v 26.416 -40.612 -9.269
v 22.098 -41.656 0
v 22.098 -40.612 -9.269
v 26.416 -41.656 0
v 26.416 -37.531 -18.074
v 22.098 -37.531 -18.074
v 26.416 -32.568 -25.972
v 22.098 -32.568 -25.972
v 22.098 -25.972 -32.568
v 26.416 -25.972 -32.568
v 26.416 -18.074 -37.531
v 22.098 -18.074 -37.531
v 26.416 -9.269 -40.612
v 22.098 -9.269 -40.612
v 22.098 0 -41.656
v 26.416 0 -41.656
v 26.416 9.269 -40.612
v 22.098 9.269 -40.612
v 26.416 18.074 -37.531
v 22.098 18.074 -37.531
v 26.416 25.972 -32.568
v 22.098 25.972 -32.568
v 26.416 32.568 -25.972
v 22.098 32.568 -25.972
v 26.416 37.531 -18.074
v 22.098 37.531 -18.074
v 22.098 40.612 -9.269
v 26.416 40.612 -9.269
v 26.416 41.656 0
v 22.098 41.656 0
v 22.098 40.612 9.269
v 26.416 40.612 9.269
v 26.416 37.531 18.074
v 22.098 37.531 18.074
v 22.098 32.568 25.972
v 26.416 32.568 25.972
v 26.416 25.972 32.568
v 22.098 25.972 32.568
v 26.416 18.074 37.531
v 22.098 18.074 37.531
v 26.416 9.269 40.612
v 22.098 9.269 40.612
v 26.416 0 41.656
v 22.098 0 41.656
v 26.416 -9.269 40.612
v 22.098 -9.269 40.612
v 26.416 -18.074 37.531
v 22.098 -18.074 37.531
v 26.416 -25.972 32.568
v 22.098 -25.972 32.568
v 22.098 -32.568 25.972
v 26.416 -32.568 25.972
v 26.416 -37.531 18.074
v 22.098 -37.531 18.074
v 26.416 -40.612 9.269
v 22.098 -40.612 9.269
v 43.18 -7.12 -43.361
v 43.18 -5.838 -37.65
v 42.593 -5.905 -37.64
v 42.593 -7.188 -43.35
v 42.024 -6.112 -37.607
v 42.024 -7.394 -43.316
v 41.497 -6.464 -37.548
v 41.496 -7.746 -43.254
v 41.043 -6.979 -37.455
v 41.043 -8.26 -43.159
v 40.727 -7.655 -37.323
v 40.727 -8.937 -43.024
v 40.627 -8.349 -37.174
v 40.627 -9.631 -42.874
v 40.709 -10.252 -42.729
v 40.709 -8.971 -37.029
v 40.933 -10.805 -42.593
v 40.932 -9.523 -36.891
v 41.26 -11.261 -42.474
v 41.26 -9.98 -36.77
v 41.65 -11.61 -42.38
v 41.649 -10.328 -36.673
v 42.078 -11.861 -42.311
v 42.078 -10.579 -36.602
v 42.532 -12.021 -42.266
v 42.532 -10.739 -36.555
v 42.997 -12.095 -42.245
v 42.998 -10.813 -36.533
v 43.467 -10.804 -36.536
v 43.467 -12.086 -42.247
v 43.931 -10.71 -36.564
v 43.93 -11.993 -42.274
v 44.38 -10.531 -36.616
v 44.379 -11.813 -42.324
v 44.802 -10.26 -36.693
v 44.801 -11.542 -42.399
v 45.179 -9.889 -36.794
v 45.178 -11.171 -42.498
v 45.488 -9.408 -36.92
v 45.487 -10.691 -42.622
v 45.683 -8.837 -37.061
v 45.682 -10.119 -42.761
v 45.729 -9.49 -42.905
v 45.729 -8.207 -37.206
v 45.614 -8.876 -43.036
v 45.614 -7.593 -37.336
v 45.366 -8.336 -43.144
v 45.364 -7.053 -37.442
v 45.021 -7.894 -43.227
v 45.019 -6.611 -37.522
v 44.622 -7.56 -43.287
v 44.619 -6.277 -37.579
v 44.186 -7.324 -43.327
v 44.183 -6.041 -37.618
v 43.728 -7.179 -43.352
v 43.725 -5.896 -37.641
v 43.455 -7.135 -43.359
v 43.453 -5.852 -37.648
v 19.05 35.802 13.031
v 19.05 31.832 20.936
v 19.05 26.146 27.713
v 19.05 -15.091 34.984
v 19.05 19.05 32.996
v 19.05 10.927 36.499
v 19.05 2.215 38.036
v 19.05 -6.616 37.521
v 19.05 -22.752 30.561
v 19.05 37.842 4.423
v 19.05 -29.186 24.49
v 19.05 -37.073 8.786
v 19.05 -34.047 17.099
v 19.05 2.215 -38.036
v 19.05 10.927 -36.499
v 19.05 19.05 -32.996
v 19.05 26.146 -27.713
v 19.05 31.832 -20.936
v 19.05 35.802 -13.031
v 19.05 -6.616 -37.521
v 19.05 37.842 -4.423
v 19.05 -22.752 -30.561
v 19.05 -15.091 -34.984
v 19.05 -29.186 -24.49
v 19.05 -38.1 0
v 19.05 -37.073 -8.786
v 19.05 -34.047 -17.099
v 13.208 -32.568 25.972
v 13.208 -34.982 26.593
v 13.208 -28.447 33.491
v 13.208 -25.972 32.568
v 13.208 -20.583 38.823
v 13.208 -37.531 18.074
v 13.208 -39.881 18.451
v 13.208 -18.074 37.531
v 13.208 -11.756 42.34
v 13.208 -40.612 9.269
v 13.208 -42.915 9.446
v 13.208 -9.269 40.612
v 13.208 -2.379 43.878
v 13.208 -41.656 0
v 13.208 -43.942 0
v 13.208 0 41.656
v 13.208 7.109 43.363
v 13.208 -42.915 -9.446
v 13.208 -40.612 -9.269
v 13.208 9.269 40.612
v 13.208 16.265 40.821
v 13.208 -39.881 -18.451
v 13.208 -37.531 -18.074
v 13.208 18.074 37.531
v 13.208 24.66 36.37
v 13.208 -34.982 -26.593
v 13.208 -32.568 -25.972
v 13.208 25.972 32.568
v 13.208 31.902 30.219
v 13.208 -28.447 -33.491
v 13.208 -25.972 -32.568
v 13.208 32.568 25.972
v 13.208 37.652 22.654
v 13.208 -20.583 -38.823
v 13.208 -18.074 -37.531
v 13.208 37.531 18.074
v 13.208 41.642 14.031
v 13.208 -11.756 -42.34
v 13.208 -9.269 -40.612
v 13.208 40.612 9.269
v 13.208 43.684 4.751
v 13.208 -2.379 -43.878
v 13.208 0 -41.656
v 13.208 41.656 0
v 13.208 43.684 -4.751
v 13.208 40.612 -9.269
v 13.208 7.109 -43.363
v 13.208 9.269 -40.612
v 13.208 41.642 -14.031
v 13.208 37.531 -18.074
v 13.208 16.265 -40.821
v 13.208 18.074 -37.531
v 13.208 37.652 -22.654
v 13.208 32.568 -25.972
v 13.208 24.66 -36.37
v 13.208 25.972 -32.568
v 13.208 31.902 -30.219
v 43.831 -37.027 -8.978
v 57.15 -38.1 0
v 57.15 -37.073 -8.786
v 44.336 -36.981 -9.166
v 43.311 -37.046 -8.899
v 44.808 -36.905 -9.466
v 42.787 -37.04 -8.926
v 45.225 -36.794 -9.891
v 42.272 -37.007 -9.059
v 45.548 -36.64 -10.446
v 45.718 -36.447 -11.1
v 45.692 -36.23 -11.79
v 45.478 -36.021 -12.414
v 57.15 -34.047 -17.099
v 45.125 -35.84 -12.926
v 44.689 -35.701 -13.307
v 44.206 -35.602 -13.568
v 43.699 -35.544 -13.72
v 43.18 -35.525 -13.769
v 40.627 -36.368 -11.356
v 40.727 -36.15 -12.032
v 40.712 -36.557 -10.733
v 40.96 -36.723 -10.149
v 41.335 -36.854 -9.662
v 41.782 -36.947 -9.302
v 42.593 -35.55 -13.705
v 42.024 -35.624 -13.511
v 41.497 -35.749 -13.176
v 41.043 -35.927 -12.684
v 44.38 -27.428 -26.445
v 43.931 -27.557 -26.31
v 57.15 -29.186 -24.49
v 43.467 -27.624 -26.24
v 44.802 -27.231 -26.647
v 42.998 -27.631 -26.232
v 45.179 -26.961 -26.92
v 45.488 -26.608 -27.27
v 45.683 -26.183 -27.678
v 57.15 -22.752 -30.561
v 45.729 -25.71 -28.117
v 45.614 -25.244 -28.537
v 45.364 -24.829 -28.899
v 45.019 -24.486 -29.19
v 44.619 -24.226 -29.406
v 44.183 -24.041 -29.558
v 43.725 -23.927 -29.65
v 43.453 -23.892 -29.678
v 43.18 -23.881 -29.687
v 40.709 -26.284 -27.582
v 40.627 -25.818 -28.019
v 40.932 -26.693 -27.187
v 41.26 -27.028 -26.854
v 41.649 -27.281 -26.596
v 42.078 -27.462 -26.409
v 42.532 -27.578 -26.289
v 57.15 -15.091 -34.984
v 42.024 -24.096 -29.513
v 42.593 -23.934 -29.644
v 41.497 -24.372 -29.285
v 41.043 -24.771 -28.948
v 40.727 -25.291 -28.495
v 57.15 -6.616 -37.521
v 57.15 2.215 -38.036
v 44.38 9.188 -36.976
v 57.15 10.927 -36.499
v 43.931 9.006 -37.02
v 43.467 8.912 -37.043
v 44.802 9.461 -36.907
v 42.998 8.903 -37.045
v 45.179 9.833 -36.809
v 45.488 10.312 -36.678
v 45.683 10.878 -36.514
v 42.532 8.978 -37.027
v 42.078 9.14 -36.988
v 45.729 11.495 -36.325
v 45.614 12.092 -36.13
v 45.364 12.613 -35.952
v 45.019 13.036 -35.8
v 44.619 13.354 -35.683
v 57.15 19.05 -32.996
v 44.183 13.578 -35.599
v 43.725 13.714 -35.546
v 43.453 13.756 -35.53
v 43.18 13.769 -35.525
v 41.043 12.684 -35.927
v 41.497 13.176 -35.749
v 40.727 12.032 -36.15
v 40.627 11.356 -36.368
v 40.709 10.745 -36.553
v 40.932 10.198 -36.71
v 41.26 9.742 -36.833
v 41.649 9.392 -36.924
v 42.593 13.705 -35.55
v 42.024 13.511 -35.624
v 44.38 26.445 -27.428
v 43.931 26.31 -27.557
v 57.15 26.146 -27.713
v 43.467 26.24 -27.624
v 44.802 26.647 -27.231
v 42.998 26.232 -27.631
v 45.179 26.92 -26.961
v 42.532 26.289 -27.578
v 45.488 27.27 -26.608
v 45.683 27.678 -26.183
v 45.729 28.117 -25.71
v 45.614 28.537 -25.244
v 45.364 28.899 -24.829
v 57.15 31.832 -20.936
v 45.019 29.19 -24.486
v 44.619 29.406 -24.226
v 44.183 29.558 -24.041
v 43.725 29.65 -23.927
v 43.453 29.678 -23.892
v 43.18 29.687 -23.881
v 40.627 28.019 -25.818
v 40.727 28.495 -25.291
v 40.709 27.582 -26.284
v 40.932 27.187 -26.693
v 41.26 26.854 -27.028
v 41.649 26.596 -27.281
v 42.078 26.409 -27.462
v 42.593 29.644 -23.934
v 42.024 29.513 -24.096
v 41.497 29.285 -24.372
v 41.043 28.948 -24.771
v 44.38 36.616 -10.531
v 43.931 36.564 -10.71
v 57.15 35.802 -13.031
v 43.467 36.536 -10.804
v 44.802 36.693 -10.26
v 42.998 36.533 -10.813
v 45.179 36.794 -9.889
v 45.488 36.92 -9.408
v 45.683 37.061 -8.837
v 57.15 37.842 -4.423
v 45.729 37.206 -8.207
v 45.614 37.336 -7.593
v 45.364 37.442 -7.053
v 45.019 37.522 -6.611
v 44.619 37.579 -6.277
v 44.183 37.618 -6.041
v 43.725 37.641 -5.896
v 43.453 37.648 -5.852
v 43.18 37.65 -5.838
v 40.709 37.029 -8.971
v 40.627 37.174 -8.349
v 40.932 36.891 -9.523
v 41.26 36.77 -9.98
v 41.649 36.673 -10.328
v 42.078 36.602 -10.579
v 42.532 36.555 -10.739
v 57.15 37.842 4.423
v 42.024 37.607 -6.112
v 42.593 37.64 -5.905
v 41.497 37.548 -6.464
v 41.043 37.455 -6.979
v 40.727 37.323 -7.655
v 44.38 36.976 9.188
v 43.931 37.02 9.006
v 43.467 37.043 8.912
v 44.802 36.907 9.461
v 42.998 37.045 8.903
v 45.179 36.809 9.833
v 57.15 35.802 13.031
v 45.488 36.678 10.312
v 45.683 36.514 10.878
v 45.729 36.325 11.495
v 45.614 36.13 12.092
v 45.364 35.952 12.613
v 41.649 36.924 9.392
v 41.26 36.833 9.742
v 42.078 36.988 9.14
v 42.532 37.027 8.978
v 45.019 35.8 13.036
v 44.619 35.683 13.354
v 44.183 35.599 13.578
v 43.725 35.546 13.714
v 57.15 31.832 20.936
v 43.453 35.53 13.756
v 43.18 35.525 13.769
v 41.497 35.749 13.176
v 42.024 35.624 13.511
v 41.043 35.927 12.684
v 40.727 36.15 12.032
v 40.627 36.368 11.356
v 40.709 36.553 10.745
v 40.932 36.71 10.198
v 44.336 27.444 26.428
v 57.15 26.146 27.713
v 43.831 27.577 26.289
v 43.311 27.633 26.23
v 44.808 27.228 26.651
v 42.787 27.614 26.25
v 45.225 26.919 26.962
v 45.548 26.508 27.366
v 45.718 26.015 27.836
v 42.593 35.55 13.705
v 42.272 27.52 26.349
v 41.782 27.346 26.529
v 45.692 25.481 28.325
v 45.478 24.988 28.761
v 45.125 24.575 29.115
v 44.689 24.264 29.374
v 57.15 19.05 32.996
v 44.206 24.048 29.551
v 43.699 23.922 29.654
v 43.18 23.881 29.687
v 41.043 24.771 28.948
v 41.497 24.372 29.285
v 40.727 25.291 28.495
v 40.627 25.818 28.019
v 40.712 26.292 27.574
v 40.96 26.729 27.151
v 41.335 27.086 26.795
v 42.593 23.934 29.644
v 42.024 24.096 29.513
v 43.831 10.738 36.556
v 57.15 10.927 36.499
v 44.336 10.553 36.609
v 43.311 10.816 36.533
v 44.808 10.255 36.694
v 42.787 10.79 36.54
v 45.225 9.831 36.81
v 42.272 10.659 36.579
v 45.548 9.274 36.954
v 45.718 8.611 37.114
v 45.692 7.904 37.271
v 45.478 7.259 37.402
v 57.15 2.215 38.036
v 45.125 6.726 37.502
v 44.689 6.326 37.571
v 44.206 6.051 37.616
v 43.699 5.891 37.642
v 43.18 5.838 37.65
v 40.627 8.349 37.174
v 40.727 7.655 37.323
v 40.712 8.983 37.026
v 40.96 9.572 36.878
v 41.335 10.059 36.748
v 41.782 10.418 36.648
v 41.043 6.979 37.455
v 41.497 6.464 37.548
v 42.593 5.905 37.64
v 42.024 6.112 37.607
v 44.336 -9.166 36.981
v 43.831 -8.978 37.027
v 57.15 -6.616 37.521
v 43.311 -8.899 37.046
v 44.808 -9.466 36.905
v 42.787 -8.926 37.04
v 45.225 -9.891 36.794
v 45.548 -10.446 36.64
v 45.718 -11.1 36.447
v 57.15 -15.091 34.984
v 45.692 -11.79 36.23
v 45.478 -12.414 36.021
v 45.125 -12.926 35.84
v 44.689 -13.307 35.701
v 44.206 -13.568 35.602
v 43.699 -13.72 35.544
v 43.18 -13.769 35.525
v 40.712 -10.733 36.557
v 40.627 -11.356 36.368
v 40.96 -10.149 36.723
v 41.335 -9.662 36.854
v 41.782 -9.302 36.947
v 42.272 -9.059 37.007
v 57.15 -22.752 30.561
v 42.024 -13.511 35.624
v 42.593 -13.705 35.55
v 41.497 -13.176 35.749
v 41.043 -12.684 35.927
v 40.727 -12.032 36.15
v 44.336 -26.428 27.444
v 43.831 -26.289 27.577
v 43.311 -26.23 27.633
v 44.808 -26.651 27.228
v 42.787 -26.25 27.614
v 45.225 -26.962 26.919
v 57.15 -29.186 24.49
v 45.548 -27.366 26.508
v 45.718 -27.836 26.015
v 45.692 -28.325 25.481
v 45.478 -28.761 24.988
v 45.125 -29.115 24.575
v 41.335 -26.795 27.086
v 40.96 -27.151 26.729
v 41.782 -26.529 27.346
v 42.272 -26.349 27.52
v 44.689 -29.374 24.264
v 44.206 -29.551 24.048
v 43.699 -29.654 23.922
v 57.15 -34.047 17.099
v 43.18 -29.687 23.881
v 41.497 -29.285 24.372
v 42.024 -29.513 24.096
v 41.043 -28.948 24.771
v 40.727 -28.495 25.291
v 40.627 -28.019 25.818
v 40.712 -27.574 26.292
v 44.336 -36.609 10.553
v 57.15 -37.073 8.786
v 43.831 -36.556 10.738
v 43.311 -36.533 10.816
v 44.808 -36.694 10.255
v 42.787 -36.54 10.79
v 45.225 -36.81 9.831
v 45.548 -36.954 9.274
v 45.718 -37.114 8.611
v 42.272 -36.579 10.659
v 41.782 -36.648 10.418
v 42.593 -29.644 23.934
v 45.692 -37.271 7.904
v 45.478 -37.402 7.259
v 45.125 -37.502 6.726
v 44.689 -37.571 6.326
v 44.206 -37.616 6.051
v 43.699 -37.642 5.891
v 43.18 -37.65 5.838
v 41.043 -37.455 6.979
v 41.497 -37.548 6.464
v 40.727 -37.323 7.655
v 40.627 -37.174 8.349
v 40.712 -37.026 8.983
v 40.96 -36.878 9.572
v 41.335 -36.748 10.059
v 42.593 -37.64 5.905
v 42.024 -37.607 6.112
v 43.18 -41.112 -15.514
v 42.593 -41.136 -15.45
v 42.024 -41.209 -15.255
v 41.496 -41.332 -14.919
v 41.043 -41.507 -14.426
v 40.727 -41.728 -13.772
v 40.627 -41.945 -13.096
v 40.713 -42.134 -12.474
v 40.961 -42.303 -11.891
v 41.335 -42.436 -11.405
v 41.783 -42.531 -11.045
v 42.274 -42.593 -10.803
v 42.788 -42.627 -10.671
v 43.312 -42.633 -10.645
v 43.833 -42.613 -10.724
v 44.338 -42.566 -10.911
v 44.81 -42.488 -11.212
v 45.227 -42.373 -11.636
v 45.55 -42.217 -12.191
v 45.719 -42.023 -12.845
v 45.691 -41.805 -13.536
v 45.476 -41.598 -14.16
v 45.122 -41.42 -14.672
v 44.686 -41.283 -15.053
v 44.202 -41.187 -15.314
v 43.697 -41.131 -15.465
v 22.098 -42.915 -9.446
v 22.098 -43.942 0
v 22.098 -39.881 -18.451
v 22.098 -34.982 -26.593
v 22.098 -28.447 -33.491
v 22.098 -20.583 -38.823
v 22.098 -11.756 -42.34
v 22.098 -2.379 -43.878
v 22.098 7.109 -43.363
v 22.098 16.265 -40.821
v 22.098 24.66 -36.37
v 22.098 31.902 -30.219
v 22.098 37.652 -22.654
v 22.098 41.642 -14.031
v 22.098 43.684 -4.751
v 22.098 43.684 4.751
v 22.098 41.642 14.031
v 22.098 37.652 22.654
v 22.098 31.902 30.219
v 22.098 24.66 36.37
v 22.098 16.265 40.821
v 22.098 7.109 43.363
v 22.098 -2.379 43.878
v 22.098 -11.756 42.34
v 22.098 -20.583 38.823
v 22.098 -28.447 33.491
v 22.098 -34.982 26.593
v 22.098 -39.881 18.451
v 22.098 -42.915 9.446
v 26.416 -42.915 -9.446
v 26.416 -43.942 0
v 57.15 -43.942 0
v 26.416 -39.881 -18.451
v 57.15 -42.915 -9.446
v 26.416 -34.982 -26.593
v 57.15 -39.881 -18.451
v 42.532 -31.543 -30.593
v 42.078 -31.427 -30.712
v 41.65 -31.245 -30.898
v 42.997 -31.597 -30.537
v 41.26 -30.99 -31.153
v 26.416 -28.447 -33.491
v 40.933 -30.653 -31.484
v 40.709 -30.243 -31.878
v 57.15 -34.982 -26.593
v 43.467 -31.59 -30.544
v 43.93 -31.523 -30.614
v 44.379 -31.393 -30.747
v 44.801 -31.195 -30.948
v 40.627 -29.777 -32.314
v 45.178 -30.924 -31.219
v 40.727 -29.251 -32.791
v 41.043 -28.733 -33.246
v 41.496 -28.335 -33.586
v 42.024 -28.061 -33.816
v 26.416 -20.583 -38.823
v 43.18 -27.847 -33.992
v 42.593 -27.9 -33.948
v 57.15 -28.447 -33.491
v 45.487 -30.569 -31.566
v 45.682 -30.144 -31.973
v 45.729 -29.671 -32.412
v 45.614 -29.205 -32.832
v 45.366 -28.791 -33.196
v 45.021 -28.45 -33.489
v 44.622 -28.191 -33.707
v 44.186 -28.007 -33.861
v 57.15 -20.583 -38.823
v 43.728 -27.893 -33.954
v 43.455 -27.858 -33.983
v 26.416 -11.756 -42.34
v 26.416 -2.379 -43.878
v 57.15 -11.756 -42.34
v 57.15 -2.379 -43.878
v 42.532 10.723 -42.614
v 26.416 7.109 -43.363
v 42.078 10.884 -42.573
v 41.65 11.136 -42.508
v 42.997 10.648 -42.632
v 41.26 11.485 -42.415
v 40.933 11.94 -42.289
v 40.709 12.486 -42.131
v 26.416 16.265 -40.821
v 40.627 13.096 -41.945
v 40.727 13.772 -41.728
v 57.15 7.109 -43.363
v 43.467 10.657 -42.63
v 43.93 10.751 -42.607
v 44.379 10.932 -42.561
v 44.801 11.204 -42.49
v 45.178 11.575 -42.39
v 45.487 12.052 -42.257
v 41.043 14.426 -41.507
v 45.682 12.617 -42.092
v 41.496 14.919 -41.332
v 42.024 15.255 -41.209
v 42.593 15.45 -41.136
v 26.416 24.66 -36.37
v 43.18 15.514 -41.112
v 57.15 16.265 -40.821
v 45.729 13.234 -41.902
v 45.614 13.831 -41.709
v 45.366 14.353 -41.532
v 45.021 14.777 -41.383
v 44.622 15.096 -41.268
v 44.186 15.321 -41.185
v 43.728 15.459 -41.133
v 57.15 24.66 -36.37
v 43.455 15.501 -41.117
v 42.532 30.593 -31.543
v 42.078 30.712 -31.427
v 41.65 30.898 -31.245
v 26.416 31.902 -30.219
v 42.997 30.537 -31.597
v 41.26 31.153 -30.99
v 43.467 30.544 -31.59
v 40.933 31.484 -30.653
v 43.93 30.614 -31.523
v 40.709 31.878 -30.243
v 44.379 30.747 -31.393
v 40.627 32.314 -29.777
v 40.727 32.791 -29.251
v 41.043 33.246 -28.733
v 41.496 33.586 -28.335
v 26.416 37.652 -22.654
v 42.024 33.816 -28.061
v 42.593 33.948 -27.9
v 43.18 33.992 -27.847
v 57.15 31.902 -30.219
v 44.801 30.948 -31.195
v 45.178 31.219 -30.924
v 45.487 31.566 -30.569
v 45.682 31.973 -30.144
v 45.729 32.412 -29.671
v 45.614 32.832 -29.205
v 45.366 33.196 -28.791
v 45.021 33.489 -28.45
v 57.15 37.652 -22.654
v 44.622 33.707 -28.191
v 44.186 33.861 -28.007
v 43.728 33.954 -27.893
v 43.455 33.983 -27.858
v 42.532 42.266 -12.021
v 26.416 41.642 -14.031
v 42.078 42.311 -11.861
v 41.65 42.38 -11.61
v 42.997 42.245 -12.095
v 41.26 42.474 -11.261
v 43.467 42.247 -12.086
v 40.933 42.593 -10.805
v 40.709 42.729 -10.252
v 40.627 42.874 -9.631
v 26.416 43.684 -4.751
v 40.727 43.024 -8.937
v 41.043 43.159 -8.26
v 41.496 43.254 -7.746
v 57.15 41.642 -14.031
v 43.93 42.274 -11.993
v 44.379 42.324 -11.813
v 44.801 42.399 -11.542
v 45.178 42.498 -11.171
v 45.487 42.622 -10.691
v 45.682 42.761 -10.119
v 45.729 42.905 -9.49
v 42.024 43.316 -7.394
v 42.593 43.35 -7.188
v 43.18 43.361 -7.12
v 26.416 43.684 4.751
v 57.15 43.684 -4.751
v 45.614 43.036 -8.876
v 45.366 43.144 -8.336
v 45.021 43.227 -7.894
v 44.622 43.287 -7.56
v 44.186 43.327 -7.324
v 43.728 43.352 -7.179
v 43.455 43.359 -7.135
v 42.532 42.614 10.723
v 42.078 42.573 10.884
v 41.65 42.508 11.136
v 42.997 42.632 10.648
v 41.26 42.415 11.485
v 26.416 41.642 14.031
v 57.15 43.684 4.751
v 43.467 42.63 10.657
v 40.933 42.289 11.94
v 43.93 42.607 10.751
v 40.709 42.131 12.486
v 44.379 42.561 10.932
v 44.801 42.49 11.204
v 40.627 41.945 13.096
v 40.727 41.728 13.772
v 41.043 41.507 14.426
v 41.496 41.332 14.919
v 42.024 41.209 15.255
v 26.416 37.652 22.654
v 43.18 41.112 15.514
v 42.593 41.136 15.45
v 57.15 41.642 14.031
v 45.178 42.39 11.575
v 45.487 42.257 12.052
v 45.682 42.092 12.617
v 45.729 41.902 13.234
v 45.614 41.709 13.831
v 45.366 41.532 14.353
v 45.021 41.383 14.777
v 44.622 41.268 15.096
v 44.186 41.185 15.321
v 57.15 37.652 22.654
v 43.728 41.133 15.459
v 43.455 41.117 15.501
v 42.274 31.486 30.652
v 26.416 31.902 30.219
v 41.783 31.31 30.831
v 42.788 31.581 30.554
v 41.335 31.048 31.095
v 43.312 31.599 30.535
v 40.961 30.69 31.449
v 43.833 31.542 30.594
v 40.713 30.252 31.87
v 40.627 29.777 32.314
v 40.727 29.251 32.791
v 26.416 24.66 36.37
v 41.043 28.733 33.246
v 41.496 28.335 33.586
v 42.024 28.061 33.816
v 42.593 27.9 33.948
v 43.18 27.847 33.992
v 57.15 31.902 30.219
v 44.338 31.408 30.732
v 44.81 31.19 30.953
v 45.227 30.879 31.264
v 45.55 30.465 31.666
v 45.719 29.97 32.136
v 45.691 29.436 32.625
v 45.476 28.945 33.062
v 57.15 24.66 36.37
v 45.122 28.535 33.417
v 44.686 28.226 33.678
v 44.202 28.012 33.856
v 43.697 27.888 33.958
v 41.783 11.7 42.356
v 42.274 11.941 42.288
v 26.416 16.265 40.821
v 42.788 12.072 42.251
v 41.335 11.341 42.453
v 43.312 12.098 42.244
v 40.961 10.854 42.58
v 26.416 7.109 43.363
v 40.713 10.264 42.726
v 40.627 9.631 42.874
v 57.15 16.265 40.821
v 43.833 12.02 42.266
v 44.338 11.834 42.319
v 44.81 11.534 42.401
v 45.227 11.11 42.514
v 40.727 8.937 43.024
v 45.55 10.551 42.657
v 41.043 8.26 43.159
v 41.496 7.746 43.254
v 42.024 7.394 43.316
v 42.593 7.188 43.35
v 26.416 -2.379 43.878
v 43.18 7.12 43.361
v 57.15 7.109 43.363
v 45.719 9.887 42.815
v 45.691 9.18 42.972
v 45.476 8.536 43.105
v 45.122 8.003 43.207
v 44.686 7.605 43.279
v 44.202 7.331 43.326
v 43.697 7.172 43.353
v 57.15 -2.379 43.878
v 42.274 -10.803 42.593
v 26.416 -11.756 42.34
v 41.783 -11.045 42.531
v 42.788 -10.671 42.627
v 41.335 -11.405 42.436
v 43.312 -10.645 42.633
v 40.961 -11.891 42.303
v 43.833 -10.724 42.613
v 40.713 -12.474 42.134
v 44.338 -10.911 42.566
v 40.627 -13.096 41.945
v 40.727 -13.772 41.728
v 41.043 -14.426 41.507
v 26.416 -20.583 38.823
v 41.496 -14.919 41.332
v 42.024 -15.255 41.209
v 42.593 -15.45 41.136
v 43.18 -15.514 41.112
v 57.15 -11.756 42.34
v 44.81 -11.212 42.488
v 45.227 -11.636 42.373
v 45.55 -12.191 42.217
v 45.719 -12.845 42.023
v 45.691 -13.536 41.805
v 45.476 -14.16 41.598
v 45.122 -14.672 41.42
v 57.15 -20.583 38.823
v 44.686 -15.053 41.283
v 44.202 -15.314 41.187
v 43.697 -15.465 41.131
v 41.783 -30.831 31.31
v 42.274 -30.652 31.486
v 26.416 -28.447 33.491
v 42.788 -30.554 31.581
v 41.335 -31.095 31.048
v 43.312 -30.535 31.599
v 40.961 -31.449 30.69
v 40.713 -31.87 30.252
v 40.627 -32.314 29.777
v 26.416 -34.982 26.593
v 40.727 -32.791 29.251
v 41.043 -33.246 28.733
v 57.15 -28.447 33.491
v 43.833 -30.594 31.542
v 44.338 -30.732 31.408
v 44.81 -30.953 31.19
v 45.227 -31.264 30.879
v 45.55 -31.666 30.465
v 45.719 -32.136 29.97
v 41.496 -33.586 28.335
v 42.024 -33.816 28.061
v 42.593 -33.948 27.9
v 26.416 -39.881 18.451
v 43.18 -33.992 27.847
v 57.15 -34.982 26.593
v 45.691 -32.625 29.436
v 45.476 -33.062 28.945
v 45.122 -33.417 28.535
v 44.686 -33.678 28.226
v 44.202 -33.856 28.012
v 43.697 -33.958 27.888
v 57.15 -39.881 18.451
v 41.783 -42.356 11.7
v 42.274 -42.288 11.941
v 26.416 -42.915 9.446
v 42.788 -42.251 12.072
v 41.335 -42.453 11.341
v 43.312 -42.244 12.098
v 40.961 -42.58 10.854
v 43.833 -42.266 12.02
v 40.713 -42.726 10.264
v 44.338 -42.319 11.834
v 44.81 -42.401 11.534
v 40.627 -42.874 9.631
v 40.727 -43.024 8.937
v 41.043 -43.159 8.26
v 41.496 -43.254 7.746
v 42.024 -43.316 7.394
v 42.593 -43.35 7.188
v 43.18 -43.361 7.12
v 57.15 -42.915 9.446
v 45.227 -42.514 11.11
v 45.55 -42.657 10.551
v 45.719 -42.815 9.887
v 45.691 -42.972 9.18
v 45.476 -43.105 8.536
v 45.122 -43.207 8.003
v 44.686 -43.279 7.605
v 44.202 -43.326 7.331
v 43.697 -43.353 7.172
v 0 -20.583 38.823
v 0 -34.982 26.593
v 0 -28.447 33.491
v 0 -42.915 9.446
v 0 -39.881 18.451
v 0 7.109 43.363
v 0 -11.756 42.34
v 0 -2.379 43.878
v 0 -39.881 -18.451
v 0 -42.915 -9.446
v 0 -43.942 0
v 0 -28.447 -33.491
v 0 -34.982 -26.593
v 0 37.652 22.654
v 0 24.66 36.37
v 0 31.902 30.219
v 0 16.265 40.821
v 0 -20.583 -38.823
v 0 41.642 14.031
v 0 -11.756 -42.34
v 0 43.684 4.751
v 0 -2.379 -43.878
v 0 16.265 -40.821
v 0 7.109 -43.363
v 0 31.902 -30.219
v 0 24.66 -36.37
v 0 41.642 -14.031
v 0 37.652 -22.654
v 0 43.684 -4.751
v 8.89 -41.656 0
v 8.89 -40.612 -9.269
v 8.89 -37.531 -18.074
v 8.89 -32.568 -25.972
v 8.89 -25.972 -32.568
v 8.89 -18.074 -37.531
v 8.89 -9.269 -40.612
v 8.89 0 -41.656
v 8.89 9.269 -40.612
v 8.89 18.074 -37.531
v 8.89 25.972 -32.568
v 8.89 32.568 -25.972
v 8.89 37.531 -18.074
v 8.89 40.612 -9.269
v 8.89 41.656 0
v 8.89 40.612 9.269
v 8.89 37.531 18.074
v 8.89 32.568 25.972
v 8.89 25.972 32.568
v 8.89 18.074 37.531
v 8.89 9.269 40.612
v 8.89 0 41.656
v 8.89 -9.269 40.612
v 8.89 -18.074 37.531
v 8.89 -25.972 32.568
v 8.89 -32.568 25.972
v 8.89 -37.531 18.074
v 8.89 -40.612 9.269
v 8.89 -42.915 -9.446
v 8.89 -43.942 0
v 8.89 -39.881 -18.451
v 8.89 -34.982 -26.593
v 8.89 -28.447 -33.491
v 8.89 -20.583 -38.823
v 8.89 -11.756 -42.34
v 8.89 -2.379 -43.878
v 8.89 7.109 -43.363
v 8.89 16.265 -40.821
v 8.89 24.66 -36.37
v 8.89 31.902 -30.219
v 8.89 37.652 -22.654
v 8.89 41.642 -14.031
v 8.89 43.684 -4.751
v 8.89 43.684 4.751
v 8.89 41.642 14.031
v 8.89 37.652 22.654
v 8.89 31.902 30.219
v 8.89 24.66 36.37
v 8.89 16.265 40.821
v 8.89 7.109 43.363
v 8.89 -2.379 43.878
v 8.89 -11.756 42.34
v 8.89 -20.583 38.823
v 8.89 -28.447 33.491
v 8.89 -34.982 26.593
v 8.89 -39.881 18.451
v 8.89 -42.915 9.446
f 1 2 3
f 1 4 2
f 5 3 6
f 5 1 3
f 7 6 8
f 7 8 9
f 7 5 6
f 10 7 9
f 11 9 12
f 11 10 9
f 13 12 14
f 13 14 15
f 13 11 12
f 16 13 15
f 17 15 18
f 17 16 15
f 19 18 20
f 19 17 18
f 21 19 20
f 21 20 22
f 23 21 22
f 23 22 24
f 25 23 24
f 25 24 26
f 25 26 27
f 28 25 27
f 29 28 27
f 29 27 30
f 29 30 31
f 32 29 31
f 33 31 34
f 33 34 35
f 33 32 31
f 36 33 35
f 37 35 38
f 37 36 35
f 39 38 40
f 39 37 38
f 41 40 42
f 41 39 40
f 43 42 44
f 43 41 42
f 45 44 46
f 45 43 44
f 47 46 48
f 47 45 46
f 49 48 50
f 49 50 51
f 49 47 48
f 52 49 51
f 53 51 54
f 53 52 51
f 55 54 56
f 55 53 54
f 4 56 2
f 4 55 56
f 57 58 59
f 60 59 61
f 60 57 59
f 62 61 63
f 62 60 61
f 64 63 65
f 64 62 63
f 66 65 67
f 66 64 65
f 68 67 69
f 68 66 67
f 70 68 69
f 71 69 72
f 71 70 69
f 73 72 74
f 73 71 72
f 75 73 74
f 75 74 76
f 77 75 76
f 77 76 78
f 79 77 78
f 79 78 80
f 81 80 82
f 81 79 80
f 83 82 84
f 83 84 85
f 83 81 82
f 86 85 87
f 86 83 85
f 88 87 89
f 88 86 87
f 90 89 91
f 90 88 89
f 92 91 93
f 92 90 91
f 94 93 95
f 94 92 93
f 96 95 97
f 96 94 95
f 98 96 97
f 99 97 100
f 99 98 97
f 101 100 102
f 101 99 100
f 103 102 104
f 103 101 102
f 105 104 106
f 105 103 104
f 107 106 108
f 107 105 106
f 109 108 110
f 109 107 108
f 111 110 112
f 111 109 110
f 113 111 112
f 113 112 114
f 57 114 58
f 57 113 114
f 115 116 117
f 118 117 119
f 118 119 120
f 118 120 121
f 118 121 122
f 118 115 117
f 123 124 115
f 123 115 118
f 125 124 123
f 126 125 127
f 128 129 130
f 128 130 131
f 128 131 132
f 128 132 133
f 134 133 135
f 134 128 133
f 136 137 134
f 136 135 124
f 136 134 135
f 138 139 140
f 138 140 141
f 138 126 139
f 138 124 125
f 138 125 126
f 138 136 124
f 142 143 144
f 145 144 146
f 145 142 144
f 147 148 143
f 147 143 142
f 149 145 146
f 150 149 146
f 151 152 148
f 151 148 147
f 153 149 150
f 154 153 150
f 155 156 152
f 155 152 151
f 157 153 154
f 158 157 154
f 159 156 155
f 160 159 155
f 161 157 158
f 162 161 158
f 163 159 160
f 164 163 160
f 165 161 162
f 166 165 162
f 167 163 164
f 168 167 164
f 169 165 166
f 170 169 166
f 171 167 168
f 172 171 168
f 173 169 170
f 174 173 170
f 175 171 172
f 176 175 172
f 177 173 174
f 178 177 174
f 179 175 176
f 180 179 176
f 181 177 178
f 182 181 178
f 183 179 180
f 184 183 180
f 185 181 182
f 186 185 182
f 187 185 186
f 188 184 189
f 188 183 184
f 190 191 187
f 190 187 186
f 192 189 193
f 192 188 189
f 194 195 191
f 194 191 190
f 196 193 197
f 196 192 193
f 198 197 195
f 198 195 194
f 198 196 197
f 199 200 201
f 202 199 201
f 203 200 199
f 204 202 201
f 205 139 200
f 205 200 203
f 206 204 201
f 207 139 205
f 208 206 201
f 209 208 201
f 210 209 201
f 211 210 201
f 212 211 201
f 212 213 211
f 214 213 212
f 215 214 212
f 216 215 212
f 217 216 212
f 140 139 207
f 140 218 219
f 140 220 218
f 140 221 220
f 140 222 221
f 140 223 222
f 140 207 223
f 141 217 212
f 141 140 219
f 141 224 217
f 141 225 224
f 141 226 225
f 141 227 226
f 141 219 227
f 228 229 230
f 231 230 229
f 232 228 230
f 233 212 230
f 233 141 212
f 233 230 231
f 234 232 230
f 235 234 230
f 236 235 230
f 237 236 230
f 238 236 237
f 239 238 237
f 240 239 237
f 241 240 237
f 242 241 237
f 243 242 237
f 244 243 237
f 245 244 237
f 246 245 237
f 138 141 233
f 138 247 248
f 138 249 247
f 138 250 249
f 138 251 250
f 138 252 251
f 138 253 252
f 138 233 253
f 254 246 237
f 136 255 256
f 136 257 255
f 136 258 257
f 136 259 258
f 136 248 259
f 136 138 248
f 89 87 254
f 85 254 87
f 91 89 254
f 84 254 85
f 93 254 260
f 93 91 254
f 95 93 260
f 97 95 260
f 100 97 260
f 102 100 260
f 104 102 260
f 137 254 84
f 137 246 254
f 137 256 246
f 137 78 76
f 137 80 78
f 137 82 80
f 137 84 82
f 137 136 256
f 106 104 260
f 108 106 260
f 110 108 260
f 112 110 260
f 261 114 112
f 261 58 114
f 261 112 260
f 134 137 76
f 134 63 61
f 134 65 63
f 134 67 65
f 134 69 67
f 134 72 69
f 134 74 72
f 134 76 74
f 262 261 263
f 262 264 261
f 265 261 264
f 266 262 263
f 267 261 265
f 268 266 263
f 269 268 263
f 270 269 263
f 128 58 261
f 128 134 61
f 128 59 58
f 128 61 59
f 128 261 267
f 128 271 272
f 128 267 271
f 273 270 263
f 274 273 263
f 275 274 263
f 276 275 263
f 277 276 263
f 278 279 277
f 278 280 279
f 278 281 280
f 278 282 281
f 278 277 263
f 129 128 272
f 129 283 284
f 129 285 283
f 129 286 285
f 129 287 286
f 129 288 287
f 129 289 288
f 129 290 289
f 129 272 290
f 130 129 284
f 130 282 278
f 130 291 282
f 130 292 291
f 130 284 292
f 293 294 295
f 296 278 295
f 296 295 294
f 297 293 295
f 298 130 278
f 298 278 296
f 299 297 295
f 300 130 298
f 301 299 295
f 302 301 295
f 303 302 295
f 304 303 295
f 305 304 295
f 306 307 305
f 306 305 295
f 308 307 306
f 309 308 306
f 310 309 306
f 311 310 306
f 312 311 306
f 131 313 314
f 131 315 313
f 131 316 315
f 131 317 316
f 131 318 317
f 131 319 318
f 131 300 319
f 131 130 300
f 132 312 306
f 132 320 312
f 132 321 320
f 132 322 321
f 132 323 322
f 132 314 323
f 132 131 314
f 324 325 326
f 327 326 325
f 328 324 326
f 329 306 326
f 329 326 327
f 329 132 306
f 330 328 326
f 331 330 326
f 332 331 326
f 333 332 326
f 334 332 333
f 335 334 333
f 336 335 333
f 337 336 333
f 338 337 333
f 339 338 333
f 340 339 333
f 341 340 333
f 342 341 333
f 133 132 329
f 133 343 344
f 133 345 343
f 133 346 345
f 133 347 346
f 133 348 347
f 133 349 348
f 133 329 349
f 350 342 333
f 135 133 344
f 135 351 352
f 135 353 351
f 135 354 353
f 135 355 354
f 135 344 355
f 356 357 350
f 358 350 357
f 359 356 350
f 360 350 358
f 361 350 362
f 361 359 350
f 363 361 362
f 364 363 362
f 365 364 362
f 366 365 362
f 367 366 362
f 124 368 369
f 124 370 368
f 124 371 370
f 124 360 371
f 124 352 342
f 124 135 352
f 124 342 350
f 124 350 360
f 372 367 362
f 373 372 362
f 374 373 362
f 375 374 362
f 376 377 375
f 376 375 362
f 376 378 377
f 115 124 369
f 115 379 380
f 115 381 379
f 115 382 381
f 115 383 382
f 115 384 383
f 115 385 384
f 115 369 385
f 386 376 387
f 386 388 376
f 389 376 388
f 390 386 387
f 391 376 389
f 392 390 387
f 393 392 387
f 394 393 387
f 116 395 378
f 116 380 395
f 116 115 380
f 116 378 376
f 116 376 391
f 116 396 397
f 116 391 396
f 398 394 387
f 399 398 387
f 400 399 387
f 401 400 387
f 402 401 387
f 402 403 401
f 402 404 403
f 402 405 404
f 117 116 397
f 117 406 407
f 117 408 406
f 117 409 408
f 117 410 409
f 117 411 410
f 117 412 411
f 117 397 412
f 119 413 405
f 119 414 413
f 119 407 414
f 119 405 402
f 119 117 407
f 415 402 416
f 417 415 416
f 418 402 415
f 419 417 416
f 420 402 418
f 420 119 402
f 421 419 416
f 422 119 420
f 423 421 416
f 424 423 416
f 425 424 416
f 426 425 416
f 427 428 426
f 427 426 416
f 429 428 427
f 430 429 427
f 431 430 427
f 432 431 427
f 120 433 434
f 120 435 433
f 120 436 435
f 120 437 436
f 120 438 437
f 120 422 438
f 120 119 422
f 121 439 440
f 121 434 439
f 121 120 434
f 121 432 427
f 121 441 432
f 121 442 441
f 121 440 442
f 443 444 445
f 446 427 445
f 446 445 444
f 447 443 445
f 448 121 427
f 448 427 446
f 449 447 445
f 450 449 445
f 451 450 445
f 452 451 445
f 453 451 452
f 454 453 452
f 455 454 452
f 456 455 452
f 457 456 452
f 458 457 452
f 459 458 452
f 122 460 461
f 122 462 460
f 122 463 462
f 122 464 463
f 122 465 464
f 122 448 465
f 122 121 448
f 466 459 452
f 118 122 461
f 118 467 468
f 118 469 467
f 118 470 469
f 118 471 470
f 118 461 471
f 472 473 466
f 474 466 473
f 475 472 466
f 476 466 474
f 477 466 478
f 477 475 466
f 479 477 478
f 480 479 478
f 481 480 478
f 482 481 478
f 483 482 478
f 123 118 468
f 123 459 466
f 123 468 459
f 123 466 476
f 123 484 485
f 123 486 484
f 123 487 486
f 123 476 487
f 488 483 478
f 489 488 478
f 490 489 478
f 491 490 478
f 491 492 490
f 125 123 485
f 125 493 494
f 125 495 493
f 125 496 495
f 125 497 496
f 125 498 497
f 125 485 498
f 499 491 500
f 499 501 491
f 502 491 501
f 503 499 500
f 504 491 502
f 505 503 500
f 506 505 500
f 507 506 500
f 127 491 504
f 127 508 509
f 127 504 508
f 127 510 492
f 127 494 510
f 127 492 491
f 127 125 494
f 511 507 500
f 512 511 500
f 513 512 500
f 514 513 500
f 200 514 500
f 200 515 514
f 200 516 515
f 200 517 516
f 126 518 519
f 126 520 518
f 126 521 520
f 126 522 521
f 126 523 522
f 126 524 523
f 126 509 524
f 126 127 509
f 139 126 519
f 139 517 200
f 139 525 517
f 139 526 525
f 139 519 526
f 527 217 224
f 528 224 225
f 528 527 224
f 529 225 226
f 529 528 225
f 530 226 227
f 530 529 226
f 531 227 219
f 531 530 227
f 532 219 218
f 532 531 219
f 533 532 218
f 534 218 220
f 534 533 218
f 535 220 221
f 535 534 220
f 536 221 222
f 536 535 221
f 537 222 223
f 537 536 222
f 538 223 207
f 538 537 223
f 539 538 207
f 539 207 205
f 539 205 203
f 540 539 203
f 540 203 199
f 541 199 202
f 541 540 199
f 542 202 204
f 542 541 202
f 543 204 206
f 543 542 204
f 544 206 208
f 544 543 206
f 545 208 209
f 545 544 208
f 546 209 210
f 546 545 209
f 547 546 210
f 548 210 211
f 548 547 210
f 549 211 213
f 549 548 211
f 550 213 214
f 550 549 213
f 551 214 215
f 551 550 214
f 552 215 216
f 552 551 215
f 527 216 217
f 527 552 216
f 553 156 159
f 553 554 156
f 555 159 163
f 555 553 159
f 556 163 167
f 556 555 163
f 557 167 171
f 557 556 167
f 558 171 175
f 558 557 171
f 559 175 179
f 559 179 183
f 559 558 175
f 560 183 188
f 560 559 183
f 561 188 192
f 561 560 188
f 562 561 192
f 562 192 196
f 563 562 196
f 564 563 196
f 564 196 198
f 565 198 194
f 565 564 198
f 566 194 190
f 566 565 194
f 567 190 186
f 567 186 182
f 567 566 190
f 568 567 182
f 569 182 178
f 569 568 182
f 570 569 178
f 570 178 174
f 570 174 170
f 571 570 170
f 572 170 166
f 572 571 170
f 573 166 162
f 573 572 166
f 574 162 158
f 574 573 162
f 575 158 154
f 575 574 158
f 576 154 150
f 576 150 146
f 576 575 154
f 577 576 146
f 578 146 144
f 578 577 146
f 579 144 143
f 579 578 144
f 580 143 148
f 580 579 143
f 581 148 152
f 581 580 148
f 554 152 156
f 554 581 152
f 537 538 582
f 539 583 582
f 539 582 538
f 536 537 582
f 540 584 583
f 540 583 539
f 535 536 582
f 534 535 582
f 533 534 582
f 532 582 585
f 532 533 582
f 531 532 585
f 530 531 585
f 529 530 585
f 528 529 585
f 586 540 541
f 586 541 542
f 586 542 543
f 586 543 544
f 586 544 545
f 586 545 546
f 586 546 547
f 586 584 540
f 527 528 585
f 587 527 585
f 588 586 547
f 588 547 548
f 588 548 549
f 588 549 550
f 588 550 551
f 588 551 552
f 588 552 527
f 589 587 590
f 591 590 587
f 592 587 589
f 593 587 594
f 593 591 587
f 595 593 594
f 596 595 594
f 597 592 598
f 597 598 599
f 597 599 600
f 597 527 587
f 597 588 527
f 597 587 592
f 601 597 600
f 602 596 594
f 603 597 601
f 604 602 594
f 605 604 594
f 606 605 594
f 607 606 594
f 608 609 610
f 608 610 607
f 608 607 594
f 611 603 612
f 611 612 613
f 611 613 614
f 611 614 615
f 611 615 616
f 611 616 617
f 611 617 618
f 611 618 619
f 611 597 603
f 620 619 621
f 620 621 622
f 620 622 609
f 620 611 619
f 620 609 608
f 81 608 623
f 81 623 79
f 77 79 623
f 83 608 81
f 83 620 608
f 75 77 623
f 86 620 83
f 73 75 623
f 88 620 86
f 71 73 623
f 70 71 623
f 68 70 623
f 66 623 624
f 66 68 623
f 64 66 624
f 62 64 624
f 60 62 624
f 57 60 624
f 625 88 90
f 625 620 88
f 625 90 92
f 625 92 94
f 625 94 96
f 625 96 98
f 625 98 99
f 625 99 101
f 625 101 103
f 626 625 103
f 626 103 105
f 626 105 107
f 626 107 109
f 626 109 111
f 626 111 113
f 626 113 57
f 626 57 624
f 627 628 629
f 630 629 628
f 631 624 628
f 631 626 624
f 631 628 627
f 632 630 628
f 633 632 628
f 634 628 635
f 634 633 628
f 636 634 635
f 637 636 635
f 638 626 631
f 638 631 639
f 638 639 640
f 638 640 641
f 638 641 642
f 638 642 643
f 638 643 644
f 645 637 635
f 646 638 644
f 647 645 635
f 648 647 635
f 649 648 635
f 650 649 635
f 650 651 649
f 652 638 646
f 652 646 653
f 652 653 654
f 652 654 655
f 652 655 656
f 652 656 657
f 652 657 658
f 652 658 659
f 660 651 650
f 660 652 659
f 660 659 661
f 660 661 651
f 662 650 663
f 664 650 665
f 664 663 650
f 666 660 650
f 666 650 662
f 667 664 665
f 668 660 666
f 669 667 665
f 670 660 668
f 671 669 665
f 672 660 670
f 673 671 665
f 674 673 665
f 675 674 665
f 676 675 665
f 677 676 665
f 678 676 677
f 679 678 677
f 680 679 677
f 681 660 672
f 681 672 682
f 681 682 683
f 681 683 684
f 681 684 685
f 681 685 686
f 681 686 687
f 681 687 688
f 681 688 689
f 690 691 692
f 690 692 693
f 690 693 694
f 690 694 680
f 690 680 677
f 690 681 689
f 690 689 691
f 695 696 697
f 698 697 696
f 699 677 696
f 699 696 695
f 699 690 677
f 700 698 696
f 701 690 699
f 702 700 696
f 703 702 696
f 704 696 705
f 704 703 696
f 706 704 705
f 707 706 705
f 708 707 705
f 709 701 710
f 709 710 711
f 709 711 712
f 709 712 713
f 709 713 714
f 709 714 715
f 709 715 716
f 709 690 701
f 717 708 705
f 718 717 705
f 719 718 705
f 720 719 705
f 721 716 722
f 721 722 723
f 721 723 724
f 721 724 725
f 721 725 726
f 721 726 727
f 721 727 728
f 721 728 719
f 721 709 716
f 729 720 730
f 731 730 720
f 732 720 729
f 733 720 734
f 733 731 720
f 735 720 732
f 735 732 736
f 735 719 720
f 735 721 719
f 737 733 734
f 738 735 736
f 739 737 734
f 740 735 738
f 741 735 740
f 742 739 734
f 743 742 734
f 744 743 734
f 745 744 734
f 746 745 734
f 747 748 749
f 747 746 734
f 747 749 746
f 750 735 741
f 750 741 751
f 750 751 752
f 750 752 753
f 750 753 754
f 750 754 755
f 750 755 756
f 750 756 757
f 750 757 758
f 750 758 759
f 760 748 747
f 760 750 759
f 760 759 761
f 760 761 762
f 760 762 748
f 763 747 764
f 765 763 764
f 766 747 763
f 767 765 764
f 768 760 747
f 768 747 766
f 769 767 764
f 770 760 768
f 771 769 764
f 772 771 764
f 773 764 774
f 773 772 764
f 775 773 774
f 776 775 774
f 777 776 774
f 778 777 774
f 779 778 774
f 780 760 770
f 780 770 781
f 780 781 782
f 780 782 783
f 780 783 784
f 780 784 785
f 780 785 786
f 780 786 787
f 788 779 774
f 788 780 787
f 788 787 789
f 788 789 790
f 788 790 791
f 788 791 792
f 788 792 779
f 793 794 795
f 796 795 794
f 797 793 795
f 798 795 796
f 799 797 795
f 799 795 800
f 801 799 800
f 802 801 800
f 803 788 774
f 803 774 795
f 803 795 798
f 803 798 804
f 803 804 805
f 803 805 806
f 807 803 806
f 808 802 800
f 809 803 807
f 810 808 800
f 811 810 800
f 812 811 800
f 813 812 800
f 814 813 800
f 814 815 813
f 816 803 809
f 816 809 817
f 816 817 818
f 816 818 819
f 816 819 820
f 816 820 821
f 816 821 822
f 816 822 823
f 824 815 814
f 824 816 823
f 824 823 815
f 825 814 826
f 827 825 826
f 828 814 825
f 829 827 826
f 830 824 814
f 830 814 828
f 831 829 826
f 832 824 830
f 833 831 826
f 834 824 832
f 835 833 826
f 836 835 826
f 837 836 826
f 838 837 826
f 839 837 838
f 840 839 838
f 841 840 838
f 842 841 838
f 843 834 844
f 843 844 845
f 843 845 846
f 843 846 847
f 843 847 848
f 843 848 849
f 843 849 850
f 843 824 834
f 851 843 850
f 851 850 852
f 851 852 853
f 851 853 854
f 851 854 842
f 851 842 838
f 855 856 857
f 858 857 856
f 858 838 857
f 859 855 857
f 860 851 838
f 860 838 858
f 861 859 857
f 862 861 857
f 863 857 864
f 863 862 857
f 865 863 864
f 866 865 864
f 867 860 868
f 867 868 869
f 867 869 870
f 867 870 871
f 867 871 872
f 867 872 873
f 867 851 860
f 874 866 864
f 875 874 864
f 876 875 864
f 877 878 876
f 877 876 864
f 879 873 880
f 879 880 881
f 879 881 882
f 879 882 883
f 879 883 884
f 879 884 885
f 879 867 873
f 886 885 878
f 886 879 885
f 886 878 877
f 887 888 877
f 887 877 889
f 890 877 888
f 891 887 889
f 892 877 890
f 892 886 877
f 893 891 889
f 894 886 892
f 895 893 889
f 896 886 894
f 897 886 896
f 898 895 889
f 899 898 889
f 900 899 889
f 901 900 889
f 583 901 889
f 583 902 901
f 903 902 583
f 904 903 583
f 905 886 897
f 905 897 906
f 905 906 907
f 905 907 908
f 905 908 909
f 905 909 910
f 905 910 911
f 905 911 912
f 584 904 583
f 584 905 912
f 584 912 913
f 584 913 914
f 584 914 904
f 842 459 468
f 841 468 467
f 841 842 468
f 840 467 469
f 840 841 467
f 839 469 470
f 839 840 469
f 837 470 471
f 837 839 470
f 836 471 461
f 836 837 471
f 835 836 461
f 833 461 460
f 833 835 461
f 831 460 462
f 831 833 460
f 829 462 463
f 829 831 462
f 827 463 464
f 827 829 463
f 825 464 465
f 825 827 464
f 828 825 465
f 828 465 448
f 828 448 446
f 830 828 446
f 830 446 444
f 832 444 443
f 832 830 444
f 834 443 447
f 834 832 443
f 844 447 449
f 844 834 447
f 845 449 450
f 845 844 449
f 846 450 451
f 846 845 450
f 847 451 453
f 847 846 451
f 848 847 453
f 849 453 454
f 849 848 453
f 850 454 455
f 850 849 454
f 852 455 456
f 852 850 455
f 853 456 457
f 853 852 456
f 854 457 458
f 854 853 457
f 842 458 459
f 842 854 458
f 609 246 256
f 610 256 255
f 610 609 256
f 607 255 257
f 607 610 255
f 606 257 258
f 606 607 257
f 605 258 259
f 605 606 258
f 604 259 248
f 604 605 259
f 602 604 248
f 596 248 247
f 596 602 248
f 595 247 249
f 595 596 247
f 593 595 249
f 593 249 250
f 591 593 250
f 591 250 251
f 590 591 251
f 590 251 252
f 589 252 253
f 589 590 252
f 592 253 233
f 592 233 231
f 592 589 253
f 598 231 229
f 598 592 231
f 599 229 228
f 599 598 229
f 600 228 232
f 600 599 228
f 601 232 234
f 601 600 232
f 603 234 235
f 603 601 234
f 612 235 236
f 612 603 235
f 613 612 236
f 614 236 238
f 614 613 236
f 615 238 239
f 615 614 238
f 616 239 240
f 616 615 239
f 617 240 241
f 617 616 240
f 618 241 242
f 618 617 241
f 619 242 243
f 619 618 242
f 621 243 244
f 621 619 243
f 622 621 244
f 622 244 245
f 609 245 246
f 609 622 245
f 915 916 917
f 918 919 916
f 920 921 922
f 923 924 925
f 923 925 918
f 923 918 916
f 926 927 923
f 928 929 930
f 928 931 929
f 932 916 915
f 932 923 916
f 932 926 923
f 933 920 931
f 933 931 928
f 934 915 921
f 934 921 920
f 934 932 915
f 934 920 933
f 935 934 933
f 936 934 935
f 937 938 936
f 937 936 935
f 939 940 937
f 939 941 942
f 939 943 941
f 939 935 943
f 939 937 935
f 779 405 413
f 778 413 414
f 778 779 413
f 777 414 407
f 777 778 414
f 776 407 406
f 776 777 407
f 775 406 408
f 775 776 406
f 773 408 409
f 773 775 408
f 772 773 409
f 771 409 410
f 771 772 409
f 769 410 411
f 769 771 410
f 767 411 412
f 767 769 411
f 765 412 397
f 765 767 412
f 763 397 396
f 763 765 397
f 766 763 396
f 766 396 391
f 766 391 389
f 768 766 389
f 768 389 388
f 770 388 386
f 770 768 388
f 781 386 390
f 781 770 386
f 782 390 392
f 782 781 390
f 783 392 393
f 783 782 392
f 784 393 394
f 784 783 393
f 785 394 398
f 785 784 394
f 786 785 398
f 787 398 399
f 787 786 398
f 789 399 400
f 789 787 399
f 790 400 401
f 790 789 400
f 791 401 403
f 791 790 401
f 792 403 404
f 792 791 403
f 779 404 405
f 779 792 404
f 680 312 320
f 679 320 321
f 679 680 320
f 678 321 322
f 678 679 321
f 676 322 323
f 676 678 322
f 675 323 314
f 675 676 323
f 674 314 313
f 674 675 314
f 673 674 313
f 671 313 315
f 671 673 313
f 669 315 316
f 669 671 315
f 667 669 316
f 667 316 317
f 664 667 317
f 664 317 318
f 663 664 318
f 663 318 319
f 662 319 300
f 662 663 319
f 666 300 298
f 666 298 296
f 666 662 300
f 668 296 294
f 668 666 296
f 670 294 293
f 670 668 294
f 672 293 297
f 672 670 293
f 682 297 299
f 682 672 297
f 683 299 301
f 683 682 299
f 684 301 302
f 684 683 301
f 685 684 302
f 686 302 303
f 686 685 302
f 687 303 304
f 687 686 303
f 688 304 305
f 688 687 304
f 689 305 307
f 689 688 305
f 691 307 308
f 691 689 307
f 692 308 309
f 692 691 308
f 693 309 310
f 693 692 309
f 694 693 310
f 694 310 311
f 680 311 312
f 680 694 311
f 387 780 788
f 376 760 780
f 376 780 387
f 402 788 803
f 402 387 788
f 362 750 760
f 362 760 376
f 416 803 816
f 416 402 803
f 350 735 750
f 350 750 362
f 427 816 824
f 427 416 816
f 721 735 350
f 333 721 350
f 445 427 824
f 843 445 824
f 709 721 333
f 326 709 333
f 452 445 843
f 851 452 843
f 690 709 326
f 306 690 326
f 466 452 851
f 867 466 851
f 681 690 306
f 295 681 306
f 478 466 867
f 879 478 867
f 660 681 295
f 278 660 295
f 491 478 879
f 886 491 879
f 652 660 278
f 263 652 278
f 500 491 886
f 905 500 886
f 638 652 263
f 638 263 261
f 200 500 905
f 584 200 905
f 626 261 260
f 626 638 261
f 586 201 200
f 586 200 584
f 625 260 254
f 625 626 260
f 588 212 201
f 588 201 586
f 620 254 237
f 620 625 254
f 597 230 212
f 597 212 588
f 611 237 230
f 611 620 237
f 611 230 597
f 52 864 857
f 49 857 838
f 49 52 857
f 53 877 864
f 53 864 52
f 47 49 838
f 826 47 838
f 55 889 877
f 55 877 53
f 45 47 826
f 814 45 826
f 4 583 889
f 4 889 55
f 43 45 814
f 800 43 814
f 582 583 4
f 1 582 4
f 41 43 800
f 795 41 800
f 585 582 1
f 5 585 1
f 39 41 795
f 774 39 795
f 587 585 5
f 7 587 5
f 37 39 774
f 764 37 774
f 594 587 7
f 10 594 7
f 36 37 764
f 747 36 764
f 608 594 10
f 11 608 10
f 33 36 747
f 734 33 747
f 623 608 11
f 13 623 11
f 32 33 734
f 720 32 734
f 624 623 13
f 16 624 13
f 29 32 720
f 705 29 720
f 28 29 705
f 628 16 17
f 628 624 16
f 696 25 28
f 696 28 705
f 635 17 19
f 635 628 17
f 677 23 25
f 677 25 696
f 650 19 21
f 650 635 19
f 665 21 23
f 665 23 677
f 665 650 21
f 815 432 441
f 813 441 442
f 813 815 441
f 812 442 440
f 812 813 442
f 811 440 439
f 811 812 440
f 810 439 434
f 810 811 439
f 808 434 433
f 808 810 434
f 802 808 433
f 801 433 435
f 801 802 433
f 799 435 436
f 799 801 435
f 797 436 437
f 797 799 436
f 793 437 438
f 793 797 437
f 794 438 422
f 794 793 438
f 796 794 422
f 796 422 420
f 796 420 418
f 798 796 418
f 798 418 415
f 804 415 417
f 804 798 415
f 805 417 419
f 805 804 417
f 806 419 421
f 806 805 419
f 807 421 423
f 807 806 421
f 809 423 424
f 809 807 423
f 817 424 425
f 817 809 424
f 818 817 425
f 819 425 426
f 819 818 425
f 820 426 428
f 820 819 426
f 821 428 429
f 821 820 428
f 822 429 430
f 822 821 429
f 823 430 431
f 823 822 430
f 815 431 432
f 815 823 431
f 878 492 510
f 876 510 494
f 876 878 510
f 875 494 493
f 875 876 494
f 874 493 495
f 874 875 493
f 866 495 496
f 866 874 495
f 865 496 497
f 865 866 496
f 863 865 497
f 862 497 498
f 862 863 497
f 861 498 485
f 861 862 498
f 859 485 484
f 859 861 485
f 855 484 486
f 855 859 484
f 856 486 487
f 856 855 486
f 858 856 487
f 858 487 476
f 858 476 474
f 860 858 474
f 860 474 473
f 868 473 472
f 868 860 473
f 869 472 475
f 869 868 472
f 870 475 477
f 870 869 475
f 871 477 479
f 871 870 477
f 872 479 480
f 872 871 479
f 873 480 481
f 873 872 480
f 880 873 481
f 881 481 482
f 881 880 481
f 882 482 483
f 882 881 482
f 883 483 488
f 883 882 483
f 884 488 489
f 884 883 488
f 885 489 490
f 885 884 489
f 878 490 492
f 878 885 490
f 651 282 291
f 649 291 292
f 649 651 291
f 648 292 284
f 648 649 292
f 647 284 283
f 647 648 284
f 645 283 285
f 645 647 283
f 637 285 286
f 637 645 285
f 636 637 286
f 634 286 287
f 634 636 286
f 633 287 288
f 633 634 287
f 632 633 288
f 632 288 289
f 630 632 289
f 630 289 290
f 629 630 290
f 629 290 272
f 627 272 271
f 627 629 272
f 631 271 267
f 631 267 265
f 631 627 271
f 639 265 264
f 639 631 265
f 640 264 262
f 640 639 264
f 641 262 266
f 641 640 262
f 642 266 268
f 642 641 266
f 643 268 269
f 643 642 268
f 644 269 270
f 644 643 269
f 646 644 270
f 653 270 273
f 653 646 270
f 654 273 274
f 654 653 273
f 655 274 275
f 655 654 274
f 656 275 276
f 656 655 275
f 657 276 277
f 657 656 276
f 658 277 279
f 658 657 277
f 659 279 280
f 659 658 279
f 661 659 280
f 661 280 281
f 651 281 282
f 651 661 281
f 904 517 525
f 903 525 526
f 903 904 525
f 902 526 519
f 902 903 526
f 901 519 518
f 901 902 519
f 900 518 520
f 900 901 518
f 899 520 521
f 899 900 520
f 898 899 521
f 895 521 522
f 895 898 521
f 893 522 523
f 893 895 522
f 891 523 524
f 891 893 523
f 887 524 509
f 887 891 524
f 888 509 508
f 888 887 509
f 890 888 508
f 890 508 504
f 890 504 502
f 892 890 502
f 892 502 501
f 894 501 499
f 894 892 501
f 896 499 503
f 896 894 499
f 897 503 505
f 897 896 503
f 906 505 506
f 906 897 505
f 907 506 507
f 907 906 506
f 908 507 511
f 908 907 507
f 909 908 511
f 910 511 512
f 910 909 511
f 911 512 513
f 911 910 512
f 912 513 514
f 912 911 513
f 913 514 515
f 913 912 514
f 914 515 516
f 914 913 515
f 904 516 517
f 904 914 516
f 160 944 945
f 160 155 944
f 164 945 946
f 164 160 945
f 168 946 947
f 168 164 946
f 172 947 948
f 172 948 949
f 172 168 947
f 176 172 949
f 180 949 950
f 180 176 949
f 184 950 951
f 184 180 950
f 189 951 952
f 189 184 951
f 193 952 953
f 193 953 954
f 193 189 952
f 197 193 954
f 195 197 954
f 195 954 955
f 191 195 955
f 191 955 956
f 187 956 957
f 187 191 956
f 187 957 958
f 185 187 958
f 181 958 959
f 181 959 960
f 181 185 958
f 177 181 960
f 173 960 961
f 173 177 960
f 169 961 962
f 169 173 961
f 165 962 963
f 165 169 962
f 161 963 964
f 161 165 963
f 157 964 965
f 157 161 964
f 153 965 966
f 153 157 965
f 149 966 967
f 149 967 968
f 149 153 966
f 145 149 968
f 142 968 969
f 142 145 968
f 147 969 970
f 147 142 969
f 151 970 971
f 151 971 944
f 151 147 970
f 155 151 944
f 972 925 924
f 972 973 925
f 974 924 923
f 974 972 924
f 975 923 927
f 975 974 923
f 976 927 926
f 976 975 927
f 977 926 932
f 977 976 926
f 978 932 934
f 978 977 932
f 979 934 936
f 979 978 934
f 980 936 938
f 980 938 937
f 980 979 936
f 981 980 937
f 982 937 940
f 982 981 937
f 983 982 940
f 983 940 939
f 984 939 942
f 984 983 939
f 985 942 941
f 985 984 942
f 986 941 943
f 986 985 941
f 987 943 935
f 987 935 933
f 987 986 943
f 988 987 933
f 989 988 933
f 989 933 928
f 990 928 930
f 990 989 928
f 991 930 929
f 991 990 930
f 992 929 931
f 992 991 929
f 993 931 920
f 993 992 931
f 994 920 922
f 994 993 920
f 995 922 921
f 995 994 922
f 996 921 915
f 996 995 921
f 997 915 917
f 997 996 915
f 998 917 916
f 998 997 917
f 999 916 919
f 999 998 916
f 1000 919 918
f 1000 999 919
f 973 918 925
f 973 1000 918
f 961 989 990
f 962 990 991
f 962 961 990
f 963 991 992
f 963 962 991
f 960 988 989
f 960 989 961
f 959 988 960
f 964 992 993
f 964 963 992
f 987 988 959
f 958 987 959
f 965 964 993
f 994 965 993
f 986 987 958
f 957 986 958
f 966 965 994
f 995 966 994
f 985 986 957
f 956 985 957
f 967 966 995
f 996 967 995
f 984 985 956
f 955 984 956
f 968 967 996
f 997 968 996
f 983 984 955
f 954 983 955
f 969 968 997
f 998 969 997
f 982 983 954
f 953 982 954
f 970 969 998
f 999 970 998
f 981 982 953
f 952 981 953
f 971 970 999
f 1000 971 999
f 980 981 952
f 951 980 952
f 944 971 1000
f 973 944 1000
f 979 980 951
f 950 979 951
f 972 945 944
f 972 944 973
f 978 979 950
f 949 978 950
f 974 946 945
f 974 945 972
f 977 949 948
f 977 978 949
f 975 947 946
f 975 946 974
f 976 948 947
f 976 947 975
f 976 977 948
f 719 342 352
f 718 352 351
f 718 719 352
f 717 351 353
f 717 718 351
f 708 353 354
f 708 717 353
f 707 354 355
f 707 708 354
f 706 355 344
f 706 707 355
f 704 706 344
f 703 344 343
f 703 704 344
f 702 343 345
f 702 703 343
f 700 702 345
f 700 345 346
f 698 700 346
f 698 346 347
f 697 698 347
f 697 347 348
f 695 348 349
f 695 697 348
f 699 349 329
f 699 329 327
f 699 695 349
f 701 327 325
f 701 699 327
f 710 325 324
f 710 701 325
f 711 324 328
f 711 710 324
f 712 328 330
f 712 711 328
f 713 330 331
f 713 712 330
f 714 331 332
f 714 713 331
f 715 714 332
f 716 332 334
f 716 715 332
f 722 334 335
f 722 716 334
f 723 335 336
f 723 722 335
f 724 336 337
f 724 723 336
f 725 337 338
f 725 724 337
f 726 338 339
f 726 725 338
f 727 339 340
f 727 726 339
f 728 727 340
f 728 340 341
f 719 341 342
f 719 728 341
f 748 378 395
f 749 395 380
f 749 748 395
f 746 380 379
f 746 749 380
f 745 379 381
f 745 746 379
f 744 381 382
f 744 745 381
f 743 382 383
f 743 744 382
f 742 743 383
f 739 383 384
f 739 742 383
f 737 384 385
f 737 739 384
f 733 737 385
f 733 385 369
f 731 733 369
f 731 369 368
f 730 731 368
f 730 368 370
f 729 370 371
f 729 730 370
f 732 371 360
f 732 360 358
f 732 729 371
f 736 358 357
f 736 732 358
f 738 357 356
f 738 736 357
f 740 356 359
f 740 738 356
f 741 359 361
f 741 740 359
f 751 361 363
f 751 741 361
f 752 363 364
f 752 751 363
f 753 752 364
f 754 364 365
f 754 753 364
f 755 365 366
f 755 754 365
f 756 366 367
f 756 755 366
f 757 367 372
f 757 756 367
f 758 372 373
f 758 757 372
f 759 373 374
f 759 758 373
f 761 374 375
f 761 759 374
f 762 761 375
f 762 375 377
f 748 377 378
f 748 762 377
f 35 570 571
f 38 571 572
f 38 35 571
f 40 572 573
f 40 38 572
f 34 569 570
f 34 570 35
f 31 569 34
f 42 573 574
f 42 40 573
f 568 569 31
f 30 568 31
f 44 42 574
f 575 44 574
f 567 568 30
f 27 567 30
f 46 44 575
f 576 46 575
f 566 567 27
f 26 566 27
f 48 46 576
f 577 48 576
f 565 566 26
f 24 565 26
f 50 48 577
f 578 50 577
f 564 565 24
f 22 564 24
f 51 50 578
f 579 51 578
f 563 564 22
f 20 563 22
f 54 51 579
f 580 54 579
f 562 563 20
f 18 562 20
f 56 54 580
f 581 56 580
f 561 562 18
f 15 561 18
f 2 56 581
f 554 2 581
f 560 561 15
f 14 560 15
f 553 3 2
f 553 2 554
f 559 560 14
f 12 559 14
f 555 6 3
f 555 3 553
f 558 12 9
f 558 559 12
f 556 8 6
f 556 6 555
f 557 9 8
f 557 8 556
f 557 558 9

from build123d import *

# Parameters (mm, degrees)
CIRPATTERN1_COUNT = 12


with BuildPart() as part:
    # Sketch1 → Revolve1 (revolve)
    with BuildSketch(Plane.XY, mode=Mode.PRIVATE) as revolve1_sk:
        Polygon((13.208, 43.942), (22.098, 43.942), (22.098, 41.656), (26.416, 41.656), (26.416, 43.942), (57.15, 43.942), (57.15, 38.1), (19.05, 38.1), (19.05, 0), (0, 0), (0, 43.942), (8.89, 43.942), (8.89, 41.656), (13.208, 41.656), align=None)
    revolve(revolve1_sk.sketch.rotate(Axis((0, 0, 0), (1, 0, 0)), 180), axis=Axis((0, 0, 0), (1, 0, 0)))

    # Sketch2 → 1/4-20 Tapped Hole1 (revolve, cut)
    with BuildSketch(Plane(origin=(43.18, 41.943899234, 13.099949659), x_dir=(0, -0.29811910378753365, 0.9545286794837113), z_dir=(1, 0, 0))):
        Polygon((0, 0), (0, 45.474816902), (2.5527, 43.941), (2.5527, 0), align=None)
    f_1_4_20_tapped_hole1 = revolve(axis=Axis((43.18, 48.005156349, 14.993005968), (0, -0.9545286794837113, -0.29811910378753365)), mode=Mode.SUBTRACT)

    # CirPattern1: 1/4-20 Tapped Hole1 ×12 about axis
    cirpattern1_axis = Axis((57.15, 0, 0), (-1, 0, 0))
    for i in range(1, CIRPATTERN1_COUNT):
        add(f_1_4_20_tapped_hole1.rotate(cirpattern1_axis, i * 360 / CIRPATTERN1_COUNT), mode=Mode.SUBTRACT)


solid = part.part
